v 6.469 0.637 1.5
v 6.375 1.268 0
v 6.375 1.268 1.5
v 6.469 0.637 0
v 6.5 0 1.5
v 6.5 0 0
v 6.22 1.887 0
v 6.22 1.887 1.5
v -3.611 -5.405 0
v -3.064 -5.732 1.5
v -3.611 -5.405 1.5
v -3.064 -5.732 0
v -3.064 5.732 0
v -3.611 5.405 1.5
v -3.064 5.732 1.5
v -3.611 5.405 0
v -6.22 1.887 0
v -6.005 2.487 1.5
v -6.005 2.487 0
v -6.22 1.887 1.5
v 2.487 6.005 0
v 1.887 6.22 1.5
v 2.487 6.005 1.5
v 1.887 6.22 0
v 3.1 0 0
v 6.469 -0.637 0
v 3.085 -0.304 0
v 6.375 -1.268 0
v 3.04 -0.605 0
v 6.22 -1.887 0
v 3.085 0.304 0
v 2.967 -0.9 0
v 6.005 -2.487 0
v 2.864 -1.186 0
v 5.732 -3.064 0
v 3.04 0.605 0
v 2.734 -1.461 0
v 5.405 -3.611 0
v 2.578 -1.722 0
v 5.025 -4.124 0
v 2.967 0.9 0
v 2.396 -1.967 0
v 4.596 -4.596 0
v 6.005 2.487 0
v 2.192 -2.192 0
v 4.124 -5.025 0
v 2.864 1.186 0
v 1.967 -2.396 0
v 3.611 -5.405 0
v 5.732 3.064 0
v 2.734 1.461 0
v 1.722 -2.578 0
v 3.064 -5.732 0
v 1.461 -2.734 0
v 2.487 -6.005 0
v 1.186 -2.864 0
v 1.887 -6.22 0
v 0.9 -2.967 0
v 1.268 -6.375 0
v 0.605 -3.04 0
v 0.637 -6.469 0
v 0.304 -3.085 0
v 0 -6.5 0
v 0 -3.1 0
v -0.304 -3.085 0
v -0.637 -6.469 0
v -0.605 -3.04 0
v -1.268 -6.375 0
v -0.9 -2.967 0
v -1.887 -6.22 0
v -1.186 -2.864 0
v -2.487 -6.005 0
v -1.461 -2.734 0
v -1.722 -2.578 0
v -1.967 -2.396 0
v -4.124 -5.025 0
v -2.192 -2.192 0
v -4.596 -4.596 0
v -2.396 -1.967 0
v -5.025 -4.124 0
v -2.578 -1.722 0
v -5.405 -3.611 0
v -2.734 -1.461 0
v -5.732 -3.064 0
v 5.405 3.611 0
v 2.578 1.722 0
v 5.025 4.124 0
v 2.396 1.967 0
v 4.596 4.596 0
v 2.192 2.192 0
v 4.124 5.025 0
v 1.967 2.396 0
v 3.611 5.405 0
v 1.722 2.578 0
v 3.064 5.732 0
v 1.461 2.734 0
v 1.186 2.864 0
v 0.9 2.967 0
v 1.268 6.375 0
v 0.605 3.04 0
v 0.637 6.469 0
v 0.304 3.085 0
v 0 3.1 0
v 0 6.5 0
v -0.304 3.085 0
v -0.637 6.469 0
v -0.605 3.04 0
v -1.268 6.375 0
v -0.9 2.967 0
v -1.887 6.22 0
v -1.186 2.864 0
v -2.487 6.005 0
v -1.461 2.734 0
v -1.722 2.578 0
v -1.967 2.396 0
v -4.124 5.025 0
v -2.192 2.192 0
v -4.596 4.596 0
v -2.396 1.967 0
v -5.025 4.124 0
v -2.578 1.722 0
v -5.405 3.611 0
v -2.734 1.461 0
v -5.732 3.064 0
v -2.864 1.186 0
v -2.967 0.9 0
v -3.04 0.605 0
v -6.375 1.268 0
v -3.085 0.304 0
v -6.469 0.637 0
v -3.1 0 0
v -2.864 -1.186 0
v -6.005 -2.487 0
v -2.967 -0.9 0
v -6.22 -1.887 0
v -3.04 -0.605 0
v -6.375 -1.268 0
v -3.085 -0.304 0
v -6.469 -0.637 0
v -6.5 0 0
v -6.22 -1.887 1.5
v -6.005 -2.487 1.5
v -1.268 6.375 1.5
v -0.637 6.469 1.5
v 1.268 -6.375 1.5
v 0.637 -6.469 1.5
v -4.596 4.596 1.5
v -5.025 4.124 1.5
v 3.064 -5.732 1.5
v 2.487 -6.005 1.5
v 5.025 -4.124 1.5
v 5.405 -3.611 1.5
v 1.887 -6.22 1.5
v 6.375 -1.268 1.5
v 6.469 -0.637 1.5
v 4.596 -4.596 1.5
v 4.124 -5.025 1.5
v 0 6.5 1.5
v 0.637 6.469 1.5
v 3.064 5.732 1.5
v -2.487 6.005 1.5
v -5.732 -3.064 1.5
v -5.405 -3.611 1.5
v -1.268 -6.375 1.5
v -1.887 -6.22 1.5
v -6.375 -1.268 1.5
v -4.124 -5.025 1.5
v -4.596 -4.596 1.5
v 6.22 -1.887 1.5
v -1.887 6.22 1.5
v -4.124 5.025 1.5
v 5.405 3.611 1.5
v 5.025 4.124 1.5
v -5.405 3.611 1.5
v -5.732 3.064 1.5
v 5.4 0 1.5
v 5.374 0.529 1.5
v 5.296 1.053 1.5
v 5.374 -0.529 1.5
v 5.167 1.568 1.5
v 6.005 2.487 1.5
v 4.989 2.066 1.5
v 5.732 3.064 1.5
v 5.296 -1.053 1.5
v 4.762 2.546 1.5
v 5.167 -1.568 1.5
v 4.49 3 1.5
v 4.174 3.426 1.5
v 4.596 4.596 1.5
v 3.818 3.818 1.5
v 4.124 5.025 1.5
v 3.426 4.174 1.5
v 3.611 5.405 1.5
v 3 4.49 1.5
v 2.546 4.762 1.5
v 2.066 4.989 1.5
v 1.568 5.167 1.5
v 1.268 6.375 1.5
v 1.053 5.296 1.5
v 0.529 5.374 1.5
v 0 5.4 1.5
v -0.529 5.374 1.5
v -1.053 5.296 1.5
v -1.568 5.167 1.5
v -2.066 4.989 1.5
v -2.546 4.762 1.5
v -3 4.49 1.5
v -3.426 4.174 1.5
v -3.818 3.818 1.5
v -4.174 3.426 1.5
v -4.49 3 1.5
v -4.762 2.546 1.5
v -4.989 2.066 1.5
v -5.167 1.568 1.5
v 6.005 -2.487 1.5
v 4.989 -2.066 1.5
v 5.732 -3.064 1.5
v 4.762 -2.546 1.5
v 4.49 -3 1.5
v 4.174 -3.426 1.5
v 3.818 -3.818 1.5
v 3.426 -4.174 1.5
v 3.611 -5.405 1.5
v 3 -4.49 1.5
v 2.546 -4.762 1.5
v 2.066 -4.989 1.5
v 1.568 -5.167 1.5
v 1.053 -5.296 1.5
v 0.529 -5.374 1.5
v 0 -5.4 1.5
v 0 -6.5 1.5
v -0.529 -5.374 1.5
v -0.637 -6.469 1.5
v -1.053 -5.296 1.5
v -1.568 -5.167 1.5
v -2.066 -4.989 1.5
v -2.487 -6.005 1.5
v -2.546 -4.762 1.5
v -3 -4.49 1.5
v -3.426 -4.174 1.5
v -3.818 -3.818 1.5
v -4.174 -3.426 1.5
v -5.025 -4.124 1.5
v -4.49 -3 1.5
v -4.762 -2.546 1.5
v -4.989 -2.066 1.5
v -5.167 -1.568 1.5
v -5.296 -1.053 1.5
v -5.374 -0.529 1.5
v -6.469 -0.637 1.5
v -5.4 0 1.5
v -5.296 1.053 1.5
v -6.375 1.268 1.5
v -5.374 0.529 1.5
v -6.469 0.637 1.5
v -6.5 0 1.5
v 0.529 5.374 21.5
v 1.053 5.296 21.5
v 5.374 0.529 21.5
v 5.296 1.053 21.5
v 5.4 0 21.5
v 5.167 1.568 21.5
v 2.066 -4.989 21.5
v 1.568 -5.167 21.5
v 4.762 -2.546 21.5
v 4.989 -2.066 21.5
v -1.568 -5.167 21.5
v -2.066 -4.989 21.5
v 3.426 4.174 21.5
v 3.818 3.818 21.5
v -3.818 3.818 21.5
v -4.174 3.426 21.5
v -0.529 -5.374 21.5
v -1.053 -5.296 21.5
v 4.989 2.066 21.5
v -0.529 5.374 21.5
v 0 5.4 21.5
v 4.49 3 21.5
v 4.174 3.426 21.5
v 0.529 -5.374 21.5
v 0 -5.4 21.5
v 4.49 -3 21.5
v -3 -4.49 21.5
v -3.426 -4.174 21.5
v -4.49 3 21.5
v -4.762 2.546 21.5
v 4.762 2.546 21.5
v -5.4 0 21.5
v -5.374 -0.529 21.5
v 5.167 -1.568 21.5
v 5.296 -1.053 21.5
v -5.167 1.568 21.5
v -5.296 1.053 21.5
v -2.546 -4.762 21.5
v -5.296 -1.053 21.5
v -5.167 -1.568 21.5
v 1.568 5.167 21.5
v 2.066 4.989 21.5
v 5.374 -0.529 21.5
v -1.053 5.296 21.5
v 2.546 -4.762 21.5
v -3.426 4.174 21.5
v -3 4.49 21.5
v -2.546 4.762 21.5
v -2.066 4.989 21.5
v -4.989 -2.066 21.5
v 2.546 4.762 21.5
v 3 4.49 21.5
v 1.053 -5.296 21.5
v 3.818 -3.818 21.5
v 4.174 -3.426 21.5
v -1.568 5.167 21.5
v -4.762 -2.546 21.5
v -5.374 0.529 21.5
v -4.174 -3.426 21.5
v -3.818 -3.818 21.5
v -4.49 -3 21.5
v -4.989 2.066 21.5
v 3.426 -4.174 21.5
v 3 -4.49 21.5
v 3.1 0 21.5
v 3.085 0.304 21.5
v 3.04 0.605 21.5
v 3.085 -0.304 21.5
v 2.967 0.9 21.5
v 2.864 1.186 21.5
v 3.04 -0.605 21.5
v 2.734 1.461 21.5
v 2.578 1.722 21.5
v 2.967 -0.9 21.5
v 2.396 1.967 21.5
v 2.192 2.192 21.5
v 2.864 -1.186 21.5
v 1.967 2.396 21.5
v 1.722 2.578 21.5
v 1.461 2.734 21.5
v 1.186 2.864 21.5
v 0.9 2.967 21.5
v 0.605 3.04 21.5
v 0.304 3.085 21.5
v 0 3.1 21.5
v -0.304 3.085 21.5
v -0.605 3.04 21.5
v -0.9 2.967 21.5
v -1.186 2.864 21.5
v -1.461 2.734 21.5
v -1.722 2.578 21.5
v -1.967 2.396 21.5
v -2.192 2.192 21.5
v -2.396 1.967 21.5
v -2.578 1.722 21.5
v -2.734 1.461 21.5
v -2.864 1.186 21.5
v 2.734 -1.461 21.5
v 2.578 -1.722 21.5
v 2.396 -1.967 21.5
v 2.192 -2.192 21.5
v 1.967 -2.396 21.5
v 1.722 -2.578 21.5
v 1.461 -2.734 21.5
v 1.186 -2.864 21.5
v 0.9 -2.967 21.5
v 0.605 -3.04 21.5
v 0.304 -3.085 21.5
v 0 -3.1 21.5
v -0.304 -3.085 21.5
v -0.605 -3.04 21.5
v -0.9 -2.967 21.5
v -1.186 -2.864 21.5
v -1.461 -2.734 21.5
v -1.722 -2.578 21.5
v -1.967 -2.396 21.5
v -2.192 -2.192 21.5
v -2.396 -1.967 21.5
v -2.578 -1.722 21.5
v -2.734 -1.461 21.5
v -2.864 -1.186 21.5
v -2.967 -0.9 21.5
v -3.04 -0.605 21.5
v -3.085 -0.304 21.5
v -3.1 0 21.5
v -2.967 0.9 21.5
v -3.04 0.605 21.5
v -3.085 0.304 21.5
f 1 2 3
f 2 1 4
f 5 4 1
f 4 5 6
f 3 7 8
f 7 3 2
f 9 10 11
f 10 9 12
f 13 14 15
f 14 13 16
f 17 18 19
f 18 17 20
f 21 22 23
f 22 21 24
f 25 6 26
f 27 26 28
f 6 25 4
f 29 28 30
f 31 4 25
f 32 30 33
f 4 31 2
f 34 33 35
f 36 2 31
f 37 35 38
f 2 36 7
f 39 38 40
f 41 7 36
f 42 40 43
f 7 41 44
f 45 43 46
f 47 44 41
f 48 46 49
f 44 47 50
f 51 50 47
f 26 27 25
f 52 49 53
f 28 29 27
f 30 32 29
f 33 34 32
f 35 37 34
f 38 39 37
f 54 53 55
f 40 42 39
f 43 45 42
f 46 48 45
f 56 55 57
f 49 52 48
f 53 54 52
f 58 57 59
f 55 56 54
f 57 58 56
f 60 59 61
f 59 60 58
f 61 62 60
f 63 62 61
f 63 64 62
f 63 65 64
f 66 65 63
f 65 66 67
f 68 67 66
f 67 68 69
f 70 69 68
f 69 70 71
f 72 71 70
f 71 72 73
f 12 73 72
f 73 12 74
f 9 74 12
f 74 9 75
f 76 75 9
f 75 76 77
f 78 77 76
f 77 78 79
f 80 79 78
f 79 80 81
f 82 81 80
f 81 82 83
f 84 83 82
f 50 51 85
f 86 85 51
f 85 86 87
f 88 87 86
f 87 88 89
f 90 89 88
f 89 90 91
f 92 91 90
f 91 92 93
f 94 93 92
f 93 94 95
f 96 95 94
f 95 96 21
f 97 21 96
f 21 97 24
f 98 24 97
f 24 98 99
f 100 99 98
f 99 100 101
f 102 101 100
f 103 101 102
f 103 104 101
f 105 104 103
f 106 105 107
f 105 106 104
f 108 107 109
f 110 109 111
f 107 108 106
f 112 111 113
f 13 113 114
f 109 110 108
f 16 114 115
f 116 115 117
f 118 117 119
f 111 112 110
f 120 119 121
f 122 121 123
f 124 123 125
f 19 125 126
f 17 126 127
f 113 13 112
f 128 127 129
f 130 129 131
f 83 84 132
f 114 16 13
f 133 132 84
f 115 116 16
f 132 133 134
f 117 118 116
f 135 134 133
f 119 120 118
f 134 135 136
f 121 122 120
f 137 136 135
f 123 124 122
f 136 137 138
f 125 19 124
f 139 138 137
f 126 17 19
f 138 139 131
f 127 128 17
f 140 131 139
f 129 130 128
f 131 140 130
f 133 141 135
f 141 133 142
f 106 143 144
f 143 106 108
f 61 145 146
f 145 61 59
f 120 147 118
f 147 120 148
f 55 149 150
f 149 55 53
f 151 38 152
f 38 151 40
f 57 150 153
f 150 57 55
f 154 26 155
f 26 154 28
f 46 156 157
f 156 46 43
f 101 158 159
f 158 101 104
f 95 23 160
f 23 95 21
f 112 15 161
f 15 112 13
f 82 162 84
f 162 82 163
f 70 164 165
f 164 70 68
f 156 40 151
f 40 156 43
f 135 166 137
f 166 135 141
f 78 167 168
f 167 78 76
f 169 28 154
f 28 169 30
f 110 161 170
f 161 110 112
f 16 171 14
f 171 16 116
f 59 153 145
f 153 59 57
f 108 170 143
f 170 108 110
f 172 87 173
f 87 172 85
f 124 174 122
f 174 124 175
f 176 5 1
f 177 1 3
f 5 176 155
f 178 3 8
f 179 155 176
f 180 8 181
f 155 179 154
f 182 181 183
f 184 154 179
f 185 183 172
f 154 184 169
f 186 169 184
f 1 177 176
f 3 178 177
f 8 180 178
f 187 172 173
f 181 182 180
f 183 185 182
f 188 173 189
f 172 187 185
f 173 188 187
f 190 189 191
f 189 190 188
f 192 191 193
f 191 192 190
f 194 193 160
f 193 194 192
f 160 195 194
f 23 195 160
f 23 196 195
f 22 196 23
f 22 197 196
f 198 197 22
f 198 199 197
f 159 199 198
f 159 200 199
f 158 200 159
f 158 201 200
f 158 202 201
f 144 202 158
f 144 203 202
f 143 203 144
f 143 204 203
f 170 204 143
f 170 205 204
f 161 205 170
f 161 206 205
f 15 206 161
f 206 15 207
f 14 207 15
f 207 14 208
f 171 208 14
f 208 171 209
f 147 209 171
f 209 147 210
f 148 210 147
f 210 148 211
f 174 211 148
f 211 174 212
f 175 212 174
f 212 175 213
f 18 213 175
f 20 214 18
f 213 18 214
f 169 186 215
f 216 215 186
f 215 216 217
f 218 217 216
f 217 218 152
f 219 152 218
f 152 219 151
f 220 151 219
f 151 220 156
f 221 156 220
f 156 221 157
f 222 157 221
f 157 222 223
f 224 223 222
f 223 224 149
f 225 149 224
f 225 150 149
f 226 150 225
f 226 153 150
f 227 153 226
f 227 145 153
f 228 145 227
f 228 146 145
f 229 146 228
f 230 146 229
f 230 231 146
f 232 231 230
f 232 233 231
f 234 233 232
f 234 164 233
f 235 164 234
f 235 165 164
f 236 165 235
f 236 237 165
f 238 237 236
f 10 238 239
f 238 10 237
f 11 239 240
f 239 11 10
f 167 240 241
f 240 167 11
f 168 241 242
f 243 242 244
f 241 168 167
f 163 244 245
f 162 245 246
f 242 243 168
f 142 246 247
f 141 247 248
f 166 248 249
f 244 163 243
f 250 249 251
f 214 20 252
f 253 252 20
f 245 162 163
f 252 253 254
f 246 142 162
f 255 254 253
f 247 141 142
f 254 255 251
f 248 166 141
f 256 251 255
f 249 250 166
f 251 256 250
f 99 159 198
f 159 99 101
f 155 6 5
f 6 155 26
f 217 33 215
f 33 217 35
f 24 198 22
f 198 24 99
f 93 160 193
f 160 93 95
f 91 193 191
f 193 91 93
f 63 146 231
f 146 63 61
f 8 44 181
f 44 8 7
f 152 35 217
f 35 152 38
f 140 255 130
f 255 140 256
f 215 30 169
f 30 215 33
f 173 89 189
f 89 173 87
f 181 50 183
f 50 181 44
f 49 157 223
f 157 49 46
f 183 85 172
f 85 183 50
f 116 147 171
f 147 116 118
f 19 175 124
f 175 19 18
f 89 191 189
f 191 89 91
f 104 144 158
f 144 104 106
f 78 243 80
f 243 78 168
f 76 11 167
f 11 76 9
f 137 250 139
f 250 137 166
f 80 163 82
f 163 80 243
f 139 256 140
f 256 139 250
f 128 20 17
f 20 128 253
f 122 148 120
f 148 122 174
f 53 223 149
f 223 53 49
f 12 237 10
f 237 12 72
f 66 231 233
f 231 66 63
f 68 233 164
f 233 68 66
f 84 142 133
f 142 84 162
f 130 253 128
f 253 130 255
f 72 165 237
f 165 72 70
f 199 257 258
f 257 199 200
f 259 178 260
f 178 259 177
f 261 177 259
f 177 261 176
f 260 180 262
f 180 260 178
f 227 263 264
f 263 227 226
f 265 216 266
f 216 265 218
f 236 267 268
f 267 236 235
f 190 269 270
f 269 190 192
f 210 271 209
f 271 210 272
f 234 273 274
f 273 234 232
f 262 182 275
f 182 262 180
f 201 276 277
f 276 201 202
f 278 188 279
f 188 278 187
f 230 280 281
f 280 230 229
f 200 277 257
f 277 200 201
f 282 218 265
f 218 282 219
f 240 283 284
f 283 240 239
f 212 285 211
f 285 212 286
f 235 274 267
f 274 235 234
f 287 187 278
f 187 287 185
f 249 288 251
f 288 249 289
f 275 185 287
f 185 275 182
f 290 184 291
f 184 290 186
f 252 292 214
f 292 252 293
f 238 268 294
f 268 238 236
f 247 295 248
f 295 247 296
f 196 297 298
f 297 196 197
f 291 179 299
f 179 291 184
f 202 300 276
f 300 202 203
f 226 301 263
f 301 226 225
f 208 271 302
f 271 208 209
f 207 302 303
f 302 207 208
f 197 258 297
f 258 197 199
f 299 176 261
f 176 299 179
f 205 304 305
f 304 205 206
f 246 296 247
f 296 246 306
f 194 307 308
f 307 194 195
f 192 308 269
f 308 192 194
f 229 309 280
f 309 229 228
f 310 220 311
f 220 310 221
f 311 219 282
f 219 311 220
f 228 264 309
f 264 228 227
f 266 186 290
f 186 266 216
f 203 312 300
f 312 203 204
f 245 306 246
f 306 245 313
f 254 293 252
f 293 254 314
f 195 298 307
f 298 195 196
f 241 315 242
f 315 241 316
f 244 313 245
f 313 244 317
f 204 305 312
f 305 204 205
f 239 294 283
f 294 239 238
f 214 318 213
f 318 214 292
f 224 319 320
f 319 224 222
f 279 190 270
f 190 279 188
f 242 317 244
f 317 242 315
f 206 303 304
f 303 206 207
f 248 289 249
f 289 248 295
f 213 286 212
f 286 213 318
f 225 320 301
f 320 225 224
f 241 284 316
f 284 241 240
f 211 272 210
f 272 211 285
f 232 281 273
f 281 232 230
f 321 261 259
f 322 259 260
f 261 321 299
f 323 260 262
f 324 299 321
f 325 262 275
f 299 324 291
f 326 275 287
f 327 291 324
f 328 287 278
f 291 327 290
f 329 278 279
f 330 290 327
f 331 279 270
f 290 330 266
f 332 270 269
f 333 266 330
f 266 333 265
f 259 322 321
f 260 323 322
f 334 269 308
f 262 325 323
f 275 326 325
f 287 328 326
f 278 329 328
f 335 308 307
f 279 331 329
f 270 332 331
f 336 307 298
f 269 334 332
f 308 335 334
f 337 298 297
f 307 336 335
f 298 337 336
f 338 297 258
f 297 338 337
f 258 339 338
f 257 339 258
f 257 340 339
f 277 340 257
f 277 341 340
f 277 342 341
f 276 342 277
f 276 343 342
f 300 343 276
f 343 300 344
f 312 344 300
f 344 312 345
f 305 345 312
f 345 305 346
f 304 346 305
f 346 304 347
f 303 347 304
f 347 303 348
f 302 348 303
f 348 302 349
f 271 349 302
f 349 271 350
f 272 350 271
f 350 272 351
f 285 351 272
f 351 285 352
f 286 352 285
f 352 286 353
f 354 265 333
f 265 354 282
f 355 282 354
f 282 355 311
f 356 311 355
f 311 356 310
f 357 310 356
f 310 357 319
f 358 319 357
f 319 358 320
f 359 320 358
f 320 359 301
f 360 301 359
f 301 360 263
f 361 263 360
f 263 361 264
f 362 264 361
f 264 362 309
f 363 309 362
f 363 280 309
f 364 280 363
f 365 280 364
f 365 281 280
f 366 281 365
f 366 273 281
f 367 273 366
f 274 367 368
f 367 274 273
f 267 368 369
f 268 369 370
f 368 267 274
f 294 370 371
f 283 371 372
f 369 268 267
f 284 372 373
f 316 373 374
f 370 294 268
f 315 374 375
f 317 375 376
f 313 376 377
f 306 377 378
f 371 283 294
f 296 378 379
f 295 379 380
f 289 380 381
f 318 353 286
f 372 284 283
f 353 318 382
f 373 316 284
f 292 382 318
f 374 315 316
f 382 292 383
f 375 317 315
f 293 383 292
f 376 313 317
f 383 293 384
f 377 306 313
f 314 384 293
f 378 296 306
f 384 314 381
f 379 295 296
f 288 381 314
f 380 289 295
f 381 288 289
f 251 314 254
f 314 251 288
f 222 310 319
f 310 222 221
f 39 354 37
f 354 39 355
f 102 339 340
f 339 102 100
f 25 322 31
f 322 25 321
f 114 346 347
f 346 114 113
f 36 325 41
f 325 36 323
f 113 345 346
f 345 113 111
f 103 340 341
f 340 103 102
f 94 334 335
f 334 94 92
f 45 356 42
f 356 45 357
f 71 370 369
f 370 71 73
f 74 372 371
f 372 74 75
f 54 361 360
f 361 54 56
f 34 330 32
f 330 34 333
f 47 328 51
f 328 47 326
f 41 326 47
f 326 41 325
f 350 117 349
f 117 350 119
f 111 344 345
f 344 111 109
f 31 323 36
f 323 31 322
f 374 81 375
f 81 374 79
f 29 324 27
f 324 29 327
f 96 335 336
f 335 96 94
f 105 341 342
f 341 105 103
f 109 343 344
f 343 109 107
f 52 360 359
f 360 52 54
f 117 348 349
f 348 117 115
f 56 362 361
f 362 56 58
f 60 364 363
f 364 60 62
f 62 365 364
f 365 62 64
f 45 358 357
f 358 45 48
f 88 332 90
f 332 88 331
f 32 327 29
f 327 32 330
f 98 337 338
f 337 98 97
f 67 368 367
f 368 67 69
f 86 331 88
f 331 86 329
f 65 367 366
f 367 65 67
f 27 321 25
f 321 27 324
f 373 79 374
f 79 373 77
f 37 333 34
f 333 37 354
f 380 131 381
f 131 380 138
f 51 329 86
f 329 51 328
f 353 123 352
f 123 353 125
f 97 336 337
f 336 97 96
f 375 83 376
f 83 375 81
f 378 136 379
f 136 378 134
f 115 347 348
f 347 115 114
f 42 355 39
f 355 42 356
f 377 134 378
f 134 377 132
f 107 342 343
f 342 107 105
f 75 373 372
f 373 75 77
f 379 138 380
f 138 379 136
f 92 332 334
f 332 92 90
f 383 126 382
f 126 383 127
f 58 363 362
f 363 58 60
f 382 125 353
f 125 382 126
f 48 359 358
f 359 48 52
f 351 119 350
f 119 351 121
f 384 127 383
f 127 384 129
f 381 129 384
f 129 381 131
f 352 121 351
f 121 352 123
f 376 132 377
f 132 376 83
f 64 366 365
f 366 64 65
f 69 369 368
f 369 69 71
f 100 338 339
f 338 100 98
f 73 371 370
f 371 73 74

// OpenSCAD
// Adapter sleeve for 0.2 mL PCR tube in a 1.5 mL rack hole.
// Print orientation: Collar on bed (z=0 to 1.5), body rises to z=21.5.

// Dimensions
collar_od = 13;
collar_t  = 1.5;
body_od   = 10.8;
body_h    = 21.5; // Total height of the part from z=0
bore_d    = 6.2;

$fn = 64;

// Calculate body height relative to the collar top
// Total height is 21.5, collar is 1.5 thick.
body_height_above_collar = body_h - collar_t;

difference() {
    union() {
        // 1. The Collar (lies on z=0)
        cylinder(h = collar_t, d = collar_od);

        // 2. The Sleeve Body (rises from z=collar_t)
        translate([0, 0, collar_t])
            cylinder(h = body_height_above_collar, d = body_od);
    }
    
    // 3. The Bore (straight hole through full height)
    // Extend slightly past top and bottom to ensure clean cut
    translate([0, 0, -1])
        cylinder(h = body_h + 2, d = bore_d);
}
